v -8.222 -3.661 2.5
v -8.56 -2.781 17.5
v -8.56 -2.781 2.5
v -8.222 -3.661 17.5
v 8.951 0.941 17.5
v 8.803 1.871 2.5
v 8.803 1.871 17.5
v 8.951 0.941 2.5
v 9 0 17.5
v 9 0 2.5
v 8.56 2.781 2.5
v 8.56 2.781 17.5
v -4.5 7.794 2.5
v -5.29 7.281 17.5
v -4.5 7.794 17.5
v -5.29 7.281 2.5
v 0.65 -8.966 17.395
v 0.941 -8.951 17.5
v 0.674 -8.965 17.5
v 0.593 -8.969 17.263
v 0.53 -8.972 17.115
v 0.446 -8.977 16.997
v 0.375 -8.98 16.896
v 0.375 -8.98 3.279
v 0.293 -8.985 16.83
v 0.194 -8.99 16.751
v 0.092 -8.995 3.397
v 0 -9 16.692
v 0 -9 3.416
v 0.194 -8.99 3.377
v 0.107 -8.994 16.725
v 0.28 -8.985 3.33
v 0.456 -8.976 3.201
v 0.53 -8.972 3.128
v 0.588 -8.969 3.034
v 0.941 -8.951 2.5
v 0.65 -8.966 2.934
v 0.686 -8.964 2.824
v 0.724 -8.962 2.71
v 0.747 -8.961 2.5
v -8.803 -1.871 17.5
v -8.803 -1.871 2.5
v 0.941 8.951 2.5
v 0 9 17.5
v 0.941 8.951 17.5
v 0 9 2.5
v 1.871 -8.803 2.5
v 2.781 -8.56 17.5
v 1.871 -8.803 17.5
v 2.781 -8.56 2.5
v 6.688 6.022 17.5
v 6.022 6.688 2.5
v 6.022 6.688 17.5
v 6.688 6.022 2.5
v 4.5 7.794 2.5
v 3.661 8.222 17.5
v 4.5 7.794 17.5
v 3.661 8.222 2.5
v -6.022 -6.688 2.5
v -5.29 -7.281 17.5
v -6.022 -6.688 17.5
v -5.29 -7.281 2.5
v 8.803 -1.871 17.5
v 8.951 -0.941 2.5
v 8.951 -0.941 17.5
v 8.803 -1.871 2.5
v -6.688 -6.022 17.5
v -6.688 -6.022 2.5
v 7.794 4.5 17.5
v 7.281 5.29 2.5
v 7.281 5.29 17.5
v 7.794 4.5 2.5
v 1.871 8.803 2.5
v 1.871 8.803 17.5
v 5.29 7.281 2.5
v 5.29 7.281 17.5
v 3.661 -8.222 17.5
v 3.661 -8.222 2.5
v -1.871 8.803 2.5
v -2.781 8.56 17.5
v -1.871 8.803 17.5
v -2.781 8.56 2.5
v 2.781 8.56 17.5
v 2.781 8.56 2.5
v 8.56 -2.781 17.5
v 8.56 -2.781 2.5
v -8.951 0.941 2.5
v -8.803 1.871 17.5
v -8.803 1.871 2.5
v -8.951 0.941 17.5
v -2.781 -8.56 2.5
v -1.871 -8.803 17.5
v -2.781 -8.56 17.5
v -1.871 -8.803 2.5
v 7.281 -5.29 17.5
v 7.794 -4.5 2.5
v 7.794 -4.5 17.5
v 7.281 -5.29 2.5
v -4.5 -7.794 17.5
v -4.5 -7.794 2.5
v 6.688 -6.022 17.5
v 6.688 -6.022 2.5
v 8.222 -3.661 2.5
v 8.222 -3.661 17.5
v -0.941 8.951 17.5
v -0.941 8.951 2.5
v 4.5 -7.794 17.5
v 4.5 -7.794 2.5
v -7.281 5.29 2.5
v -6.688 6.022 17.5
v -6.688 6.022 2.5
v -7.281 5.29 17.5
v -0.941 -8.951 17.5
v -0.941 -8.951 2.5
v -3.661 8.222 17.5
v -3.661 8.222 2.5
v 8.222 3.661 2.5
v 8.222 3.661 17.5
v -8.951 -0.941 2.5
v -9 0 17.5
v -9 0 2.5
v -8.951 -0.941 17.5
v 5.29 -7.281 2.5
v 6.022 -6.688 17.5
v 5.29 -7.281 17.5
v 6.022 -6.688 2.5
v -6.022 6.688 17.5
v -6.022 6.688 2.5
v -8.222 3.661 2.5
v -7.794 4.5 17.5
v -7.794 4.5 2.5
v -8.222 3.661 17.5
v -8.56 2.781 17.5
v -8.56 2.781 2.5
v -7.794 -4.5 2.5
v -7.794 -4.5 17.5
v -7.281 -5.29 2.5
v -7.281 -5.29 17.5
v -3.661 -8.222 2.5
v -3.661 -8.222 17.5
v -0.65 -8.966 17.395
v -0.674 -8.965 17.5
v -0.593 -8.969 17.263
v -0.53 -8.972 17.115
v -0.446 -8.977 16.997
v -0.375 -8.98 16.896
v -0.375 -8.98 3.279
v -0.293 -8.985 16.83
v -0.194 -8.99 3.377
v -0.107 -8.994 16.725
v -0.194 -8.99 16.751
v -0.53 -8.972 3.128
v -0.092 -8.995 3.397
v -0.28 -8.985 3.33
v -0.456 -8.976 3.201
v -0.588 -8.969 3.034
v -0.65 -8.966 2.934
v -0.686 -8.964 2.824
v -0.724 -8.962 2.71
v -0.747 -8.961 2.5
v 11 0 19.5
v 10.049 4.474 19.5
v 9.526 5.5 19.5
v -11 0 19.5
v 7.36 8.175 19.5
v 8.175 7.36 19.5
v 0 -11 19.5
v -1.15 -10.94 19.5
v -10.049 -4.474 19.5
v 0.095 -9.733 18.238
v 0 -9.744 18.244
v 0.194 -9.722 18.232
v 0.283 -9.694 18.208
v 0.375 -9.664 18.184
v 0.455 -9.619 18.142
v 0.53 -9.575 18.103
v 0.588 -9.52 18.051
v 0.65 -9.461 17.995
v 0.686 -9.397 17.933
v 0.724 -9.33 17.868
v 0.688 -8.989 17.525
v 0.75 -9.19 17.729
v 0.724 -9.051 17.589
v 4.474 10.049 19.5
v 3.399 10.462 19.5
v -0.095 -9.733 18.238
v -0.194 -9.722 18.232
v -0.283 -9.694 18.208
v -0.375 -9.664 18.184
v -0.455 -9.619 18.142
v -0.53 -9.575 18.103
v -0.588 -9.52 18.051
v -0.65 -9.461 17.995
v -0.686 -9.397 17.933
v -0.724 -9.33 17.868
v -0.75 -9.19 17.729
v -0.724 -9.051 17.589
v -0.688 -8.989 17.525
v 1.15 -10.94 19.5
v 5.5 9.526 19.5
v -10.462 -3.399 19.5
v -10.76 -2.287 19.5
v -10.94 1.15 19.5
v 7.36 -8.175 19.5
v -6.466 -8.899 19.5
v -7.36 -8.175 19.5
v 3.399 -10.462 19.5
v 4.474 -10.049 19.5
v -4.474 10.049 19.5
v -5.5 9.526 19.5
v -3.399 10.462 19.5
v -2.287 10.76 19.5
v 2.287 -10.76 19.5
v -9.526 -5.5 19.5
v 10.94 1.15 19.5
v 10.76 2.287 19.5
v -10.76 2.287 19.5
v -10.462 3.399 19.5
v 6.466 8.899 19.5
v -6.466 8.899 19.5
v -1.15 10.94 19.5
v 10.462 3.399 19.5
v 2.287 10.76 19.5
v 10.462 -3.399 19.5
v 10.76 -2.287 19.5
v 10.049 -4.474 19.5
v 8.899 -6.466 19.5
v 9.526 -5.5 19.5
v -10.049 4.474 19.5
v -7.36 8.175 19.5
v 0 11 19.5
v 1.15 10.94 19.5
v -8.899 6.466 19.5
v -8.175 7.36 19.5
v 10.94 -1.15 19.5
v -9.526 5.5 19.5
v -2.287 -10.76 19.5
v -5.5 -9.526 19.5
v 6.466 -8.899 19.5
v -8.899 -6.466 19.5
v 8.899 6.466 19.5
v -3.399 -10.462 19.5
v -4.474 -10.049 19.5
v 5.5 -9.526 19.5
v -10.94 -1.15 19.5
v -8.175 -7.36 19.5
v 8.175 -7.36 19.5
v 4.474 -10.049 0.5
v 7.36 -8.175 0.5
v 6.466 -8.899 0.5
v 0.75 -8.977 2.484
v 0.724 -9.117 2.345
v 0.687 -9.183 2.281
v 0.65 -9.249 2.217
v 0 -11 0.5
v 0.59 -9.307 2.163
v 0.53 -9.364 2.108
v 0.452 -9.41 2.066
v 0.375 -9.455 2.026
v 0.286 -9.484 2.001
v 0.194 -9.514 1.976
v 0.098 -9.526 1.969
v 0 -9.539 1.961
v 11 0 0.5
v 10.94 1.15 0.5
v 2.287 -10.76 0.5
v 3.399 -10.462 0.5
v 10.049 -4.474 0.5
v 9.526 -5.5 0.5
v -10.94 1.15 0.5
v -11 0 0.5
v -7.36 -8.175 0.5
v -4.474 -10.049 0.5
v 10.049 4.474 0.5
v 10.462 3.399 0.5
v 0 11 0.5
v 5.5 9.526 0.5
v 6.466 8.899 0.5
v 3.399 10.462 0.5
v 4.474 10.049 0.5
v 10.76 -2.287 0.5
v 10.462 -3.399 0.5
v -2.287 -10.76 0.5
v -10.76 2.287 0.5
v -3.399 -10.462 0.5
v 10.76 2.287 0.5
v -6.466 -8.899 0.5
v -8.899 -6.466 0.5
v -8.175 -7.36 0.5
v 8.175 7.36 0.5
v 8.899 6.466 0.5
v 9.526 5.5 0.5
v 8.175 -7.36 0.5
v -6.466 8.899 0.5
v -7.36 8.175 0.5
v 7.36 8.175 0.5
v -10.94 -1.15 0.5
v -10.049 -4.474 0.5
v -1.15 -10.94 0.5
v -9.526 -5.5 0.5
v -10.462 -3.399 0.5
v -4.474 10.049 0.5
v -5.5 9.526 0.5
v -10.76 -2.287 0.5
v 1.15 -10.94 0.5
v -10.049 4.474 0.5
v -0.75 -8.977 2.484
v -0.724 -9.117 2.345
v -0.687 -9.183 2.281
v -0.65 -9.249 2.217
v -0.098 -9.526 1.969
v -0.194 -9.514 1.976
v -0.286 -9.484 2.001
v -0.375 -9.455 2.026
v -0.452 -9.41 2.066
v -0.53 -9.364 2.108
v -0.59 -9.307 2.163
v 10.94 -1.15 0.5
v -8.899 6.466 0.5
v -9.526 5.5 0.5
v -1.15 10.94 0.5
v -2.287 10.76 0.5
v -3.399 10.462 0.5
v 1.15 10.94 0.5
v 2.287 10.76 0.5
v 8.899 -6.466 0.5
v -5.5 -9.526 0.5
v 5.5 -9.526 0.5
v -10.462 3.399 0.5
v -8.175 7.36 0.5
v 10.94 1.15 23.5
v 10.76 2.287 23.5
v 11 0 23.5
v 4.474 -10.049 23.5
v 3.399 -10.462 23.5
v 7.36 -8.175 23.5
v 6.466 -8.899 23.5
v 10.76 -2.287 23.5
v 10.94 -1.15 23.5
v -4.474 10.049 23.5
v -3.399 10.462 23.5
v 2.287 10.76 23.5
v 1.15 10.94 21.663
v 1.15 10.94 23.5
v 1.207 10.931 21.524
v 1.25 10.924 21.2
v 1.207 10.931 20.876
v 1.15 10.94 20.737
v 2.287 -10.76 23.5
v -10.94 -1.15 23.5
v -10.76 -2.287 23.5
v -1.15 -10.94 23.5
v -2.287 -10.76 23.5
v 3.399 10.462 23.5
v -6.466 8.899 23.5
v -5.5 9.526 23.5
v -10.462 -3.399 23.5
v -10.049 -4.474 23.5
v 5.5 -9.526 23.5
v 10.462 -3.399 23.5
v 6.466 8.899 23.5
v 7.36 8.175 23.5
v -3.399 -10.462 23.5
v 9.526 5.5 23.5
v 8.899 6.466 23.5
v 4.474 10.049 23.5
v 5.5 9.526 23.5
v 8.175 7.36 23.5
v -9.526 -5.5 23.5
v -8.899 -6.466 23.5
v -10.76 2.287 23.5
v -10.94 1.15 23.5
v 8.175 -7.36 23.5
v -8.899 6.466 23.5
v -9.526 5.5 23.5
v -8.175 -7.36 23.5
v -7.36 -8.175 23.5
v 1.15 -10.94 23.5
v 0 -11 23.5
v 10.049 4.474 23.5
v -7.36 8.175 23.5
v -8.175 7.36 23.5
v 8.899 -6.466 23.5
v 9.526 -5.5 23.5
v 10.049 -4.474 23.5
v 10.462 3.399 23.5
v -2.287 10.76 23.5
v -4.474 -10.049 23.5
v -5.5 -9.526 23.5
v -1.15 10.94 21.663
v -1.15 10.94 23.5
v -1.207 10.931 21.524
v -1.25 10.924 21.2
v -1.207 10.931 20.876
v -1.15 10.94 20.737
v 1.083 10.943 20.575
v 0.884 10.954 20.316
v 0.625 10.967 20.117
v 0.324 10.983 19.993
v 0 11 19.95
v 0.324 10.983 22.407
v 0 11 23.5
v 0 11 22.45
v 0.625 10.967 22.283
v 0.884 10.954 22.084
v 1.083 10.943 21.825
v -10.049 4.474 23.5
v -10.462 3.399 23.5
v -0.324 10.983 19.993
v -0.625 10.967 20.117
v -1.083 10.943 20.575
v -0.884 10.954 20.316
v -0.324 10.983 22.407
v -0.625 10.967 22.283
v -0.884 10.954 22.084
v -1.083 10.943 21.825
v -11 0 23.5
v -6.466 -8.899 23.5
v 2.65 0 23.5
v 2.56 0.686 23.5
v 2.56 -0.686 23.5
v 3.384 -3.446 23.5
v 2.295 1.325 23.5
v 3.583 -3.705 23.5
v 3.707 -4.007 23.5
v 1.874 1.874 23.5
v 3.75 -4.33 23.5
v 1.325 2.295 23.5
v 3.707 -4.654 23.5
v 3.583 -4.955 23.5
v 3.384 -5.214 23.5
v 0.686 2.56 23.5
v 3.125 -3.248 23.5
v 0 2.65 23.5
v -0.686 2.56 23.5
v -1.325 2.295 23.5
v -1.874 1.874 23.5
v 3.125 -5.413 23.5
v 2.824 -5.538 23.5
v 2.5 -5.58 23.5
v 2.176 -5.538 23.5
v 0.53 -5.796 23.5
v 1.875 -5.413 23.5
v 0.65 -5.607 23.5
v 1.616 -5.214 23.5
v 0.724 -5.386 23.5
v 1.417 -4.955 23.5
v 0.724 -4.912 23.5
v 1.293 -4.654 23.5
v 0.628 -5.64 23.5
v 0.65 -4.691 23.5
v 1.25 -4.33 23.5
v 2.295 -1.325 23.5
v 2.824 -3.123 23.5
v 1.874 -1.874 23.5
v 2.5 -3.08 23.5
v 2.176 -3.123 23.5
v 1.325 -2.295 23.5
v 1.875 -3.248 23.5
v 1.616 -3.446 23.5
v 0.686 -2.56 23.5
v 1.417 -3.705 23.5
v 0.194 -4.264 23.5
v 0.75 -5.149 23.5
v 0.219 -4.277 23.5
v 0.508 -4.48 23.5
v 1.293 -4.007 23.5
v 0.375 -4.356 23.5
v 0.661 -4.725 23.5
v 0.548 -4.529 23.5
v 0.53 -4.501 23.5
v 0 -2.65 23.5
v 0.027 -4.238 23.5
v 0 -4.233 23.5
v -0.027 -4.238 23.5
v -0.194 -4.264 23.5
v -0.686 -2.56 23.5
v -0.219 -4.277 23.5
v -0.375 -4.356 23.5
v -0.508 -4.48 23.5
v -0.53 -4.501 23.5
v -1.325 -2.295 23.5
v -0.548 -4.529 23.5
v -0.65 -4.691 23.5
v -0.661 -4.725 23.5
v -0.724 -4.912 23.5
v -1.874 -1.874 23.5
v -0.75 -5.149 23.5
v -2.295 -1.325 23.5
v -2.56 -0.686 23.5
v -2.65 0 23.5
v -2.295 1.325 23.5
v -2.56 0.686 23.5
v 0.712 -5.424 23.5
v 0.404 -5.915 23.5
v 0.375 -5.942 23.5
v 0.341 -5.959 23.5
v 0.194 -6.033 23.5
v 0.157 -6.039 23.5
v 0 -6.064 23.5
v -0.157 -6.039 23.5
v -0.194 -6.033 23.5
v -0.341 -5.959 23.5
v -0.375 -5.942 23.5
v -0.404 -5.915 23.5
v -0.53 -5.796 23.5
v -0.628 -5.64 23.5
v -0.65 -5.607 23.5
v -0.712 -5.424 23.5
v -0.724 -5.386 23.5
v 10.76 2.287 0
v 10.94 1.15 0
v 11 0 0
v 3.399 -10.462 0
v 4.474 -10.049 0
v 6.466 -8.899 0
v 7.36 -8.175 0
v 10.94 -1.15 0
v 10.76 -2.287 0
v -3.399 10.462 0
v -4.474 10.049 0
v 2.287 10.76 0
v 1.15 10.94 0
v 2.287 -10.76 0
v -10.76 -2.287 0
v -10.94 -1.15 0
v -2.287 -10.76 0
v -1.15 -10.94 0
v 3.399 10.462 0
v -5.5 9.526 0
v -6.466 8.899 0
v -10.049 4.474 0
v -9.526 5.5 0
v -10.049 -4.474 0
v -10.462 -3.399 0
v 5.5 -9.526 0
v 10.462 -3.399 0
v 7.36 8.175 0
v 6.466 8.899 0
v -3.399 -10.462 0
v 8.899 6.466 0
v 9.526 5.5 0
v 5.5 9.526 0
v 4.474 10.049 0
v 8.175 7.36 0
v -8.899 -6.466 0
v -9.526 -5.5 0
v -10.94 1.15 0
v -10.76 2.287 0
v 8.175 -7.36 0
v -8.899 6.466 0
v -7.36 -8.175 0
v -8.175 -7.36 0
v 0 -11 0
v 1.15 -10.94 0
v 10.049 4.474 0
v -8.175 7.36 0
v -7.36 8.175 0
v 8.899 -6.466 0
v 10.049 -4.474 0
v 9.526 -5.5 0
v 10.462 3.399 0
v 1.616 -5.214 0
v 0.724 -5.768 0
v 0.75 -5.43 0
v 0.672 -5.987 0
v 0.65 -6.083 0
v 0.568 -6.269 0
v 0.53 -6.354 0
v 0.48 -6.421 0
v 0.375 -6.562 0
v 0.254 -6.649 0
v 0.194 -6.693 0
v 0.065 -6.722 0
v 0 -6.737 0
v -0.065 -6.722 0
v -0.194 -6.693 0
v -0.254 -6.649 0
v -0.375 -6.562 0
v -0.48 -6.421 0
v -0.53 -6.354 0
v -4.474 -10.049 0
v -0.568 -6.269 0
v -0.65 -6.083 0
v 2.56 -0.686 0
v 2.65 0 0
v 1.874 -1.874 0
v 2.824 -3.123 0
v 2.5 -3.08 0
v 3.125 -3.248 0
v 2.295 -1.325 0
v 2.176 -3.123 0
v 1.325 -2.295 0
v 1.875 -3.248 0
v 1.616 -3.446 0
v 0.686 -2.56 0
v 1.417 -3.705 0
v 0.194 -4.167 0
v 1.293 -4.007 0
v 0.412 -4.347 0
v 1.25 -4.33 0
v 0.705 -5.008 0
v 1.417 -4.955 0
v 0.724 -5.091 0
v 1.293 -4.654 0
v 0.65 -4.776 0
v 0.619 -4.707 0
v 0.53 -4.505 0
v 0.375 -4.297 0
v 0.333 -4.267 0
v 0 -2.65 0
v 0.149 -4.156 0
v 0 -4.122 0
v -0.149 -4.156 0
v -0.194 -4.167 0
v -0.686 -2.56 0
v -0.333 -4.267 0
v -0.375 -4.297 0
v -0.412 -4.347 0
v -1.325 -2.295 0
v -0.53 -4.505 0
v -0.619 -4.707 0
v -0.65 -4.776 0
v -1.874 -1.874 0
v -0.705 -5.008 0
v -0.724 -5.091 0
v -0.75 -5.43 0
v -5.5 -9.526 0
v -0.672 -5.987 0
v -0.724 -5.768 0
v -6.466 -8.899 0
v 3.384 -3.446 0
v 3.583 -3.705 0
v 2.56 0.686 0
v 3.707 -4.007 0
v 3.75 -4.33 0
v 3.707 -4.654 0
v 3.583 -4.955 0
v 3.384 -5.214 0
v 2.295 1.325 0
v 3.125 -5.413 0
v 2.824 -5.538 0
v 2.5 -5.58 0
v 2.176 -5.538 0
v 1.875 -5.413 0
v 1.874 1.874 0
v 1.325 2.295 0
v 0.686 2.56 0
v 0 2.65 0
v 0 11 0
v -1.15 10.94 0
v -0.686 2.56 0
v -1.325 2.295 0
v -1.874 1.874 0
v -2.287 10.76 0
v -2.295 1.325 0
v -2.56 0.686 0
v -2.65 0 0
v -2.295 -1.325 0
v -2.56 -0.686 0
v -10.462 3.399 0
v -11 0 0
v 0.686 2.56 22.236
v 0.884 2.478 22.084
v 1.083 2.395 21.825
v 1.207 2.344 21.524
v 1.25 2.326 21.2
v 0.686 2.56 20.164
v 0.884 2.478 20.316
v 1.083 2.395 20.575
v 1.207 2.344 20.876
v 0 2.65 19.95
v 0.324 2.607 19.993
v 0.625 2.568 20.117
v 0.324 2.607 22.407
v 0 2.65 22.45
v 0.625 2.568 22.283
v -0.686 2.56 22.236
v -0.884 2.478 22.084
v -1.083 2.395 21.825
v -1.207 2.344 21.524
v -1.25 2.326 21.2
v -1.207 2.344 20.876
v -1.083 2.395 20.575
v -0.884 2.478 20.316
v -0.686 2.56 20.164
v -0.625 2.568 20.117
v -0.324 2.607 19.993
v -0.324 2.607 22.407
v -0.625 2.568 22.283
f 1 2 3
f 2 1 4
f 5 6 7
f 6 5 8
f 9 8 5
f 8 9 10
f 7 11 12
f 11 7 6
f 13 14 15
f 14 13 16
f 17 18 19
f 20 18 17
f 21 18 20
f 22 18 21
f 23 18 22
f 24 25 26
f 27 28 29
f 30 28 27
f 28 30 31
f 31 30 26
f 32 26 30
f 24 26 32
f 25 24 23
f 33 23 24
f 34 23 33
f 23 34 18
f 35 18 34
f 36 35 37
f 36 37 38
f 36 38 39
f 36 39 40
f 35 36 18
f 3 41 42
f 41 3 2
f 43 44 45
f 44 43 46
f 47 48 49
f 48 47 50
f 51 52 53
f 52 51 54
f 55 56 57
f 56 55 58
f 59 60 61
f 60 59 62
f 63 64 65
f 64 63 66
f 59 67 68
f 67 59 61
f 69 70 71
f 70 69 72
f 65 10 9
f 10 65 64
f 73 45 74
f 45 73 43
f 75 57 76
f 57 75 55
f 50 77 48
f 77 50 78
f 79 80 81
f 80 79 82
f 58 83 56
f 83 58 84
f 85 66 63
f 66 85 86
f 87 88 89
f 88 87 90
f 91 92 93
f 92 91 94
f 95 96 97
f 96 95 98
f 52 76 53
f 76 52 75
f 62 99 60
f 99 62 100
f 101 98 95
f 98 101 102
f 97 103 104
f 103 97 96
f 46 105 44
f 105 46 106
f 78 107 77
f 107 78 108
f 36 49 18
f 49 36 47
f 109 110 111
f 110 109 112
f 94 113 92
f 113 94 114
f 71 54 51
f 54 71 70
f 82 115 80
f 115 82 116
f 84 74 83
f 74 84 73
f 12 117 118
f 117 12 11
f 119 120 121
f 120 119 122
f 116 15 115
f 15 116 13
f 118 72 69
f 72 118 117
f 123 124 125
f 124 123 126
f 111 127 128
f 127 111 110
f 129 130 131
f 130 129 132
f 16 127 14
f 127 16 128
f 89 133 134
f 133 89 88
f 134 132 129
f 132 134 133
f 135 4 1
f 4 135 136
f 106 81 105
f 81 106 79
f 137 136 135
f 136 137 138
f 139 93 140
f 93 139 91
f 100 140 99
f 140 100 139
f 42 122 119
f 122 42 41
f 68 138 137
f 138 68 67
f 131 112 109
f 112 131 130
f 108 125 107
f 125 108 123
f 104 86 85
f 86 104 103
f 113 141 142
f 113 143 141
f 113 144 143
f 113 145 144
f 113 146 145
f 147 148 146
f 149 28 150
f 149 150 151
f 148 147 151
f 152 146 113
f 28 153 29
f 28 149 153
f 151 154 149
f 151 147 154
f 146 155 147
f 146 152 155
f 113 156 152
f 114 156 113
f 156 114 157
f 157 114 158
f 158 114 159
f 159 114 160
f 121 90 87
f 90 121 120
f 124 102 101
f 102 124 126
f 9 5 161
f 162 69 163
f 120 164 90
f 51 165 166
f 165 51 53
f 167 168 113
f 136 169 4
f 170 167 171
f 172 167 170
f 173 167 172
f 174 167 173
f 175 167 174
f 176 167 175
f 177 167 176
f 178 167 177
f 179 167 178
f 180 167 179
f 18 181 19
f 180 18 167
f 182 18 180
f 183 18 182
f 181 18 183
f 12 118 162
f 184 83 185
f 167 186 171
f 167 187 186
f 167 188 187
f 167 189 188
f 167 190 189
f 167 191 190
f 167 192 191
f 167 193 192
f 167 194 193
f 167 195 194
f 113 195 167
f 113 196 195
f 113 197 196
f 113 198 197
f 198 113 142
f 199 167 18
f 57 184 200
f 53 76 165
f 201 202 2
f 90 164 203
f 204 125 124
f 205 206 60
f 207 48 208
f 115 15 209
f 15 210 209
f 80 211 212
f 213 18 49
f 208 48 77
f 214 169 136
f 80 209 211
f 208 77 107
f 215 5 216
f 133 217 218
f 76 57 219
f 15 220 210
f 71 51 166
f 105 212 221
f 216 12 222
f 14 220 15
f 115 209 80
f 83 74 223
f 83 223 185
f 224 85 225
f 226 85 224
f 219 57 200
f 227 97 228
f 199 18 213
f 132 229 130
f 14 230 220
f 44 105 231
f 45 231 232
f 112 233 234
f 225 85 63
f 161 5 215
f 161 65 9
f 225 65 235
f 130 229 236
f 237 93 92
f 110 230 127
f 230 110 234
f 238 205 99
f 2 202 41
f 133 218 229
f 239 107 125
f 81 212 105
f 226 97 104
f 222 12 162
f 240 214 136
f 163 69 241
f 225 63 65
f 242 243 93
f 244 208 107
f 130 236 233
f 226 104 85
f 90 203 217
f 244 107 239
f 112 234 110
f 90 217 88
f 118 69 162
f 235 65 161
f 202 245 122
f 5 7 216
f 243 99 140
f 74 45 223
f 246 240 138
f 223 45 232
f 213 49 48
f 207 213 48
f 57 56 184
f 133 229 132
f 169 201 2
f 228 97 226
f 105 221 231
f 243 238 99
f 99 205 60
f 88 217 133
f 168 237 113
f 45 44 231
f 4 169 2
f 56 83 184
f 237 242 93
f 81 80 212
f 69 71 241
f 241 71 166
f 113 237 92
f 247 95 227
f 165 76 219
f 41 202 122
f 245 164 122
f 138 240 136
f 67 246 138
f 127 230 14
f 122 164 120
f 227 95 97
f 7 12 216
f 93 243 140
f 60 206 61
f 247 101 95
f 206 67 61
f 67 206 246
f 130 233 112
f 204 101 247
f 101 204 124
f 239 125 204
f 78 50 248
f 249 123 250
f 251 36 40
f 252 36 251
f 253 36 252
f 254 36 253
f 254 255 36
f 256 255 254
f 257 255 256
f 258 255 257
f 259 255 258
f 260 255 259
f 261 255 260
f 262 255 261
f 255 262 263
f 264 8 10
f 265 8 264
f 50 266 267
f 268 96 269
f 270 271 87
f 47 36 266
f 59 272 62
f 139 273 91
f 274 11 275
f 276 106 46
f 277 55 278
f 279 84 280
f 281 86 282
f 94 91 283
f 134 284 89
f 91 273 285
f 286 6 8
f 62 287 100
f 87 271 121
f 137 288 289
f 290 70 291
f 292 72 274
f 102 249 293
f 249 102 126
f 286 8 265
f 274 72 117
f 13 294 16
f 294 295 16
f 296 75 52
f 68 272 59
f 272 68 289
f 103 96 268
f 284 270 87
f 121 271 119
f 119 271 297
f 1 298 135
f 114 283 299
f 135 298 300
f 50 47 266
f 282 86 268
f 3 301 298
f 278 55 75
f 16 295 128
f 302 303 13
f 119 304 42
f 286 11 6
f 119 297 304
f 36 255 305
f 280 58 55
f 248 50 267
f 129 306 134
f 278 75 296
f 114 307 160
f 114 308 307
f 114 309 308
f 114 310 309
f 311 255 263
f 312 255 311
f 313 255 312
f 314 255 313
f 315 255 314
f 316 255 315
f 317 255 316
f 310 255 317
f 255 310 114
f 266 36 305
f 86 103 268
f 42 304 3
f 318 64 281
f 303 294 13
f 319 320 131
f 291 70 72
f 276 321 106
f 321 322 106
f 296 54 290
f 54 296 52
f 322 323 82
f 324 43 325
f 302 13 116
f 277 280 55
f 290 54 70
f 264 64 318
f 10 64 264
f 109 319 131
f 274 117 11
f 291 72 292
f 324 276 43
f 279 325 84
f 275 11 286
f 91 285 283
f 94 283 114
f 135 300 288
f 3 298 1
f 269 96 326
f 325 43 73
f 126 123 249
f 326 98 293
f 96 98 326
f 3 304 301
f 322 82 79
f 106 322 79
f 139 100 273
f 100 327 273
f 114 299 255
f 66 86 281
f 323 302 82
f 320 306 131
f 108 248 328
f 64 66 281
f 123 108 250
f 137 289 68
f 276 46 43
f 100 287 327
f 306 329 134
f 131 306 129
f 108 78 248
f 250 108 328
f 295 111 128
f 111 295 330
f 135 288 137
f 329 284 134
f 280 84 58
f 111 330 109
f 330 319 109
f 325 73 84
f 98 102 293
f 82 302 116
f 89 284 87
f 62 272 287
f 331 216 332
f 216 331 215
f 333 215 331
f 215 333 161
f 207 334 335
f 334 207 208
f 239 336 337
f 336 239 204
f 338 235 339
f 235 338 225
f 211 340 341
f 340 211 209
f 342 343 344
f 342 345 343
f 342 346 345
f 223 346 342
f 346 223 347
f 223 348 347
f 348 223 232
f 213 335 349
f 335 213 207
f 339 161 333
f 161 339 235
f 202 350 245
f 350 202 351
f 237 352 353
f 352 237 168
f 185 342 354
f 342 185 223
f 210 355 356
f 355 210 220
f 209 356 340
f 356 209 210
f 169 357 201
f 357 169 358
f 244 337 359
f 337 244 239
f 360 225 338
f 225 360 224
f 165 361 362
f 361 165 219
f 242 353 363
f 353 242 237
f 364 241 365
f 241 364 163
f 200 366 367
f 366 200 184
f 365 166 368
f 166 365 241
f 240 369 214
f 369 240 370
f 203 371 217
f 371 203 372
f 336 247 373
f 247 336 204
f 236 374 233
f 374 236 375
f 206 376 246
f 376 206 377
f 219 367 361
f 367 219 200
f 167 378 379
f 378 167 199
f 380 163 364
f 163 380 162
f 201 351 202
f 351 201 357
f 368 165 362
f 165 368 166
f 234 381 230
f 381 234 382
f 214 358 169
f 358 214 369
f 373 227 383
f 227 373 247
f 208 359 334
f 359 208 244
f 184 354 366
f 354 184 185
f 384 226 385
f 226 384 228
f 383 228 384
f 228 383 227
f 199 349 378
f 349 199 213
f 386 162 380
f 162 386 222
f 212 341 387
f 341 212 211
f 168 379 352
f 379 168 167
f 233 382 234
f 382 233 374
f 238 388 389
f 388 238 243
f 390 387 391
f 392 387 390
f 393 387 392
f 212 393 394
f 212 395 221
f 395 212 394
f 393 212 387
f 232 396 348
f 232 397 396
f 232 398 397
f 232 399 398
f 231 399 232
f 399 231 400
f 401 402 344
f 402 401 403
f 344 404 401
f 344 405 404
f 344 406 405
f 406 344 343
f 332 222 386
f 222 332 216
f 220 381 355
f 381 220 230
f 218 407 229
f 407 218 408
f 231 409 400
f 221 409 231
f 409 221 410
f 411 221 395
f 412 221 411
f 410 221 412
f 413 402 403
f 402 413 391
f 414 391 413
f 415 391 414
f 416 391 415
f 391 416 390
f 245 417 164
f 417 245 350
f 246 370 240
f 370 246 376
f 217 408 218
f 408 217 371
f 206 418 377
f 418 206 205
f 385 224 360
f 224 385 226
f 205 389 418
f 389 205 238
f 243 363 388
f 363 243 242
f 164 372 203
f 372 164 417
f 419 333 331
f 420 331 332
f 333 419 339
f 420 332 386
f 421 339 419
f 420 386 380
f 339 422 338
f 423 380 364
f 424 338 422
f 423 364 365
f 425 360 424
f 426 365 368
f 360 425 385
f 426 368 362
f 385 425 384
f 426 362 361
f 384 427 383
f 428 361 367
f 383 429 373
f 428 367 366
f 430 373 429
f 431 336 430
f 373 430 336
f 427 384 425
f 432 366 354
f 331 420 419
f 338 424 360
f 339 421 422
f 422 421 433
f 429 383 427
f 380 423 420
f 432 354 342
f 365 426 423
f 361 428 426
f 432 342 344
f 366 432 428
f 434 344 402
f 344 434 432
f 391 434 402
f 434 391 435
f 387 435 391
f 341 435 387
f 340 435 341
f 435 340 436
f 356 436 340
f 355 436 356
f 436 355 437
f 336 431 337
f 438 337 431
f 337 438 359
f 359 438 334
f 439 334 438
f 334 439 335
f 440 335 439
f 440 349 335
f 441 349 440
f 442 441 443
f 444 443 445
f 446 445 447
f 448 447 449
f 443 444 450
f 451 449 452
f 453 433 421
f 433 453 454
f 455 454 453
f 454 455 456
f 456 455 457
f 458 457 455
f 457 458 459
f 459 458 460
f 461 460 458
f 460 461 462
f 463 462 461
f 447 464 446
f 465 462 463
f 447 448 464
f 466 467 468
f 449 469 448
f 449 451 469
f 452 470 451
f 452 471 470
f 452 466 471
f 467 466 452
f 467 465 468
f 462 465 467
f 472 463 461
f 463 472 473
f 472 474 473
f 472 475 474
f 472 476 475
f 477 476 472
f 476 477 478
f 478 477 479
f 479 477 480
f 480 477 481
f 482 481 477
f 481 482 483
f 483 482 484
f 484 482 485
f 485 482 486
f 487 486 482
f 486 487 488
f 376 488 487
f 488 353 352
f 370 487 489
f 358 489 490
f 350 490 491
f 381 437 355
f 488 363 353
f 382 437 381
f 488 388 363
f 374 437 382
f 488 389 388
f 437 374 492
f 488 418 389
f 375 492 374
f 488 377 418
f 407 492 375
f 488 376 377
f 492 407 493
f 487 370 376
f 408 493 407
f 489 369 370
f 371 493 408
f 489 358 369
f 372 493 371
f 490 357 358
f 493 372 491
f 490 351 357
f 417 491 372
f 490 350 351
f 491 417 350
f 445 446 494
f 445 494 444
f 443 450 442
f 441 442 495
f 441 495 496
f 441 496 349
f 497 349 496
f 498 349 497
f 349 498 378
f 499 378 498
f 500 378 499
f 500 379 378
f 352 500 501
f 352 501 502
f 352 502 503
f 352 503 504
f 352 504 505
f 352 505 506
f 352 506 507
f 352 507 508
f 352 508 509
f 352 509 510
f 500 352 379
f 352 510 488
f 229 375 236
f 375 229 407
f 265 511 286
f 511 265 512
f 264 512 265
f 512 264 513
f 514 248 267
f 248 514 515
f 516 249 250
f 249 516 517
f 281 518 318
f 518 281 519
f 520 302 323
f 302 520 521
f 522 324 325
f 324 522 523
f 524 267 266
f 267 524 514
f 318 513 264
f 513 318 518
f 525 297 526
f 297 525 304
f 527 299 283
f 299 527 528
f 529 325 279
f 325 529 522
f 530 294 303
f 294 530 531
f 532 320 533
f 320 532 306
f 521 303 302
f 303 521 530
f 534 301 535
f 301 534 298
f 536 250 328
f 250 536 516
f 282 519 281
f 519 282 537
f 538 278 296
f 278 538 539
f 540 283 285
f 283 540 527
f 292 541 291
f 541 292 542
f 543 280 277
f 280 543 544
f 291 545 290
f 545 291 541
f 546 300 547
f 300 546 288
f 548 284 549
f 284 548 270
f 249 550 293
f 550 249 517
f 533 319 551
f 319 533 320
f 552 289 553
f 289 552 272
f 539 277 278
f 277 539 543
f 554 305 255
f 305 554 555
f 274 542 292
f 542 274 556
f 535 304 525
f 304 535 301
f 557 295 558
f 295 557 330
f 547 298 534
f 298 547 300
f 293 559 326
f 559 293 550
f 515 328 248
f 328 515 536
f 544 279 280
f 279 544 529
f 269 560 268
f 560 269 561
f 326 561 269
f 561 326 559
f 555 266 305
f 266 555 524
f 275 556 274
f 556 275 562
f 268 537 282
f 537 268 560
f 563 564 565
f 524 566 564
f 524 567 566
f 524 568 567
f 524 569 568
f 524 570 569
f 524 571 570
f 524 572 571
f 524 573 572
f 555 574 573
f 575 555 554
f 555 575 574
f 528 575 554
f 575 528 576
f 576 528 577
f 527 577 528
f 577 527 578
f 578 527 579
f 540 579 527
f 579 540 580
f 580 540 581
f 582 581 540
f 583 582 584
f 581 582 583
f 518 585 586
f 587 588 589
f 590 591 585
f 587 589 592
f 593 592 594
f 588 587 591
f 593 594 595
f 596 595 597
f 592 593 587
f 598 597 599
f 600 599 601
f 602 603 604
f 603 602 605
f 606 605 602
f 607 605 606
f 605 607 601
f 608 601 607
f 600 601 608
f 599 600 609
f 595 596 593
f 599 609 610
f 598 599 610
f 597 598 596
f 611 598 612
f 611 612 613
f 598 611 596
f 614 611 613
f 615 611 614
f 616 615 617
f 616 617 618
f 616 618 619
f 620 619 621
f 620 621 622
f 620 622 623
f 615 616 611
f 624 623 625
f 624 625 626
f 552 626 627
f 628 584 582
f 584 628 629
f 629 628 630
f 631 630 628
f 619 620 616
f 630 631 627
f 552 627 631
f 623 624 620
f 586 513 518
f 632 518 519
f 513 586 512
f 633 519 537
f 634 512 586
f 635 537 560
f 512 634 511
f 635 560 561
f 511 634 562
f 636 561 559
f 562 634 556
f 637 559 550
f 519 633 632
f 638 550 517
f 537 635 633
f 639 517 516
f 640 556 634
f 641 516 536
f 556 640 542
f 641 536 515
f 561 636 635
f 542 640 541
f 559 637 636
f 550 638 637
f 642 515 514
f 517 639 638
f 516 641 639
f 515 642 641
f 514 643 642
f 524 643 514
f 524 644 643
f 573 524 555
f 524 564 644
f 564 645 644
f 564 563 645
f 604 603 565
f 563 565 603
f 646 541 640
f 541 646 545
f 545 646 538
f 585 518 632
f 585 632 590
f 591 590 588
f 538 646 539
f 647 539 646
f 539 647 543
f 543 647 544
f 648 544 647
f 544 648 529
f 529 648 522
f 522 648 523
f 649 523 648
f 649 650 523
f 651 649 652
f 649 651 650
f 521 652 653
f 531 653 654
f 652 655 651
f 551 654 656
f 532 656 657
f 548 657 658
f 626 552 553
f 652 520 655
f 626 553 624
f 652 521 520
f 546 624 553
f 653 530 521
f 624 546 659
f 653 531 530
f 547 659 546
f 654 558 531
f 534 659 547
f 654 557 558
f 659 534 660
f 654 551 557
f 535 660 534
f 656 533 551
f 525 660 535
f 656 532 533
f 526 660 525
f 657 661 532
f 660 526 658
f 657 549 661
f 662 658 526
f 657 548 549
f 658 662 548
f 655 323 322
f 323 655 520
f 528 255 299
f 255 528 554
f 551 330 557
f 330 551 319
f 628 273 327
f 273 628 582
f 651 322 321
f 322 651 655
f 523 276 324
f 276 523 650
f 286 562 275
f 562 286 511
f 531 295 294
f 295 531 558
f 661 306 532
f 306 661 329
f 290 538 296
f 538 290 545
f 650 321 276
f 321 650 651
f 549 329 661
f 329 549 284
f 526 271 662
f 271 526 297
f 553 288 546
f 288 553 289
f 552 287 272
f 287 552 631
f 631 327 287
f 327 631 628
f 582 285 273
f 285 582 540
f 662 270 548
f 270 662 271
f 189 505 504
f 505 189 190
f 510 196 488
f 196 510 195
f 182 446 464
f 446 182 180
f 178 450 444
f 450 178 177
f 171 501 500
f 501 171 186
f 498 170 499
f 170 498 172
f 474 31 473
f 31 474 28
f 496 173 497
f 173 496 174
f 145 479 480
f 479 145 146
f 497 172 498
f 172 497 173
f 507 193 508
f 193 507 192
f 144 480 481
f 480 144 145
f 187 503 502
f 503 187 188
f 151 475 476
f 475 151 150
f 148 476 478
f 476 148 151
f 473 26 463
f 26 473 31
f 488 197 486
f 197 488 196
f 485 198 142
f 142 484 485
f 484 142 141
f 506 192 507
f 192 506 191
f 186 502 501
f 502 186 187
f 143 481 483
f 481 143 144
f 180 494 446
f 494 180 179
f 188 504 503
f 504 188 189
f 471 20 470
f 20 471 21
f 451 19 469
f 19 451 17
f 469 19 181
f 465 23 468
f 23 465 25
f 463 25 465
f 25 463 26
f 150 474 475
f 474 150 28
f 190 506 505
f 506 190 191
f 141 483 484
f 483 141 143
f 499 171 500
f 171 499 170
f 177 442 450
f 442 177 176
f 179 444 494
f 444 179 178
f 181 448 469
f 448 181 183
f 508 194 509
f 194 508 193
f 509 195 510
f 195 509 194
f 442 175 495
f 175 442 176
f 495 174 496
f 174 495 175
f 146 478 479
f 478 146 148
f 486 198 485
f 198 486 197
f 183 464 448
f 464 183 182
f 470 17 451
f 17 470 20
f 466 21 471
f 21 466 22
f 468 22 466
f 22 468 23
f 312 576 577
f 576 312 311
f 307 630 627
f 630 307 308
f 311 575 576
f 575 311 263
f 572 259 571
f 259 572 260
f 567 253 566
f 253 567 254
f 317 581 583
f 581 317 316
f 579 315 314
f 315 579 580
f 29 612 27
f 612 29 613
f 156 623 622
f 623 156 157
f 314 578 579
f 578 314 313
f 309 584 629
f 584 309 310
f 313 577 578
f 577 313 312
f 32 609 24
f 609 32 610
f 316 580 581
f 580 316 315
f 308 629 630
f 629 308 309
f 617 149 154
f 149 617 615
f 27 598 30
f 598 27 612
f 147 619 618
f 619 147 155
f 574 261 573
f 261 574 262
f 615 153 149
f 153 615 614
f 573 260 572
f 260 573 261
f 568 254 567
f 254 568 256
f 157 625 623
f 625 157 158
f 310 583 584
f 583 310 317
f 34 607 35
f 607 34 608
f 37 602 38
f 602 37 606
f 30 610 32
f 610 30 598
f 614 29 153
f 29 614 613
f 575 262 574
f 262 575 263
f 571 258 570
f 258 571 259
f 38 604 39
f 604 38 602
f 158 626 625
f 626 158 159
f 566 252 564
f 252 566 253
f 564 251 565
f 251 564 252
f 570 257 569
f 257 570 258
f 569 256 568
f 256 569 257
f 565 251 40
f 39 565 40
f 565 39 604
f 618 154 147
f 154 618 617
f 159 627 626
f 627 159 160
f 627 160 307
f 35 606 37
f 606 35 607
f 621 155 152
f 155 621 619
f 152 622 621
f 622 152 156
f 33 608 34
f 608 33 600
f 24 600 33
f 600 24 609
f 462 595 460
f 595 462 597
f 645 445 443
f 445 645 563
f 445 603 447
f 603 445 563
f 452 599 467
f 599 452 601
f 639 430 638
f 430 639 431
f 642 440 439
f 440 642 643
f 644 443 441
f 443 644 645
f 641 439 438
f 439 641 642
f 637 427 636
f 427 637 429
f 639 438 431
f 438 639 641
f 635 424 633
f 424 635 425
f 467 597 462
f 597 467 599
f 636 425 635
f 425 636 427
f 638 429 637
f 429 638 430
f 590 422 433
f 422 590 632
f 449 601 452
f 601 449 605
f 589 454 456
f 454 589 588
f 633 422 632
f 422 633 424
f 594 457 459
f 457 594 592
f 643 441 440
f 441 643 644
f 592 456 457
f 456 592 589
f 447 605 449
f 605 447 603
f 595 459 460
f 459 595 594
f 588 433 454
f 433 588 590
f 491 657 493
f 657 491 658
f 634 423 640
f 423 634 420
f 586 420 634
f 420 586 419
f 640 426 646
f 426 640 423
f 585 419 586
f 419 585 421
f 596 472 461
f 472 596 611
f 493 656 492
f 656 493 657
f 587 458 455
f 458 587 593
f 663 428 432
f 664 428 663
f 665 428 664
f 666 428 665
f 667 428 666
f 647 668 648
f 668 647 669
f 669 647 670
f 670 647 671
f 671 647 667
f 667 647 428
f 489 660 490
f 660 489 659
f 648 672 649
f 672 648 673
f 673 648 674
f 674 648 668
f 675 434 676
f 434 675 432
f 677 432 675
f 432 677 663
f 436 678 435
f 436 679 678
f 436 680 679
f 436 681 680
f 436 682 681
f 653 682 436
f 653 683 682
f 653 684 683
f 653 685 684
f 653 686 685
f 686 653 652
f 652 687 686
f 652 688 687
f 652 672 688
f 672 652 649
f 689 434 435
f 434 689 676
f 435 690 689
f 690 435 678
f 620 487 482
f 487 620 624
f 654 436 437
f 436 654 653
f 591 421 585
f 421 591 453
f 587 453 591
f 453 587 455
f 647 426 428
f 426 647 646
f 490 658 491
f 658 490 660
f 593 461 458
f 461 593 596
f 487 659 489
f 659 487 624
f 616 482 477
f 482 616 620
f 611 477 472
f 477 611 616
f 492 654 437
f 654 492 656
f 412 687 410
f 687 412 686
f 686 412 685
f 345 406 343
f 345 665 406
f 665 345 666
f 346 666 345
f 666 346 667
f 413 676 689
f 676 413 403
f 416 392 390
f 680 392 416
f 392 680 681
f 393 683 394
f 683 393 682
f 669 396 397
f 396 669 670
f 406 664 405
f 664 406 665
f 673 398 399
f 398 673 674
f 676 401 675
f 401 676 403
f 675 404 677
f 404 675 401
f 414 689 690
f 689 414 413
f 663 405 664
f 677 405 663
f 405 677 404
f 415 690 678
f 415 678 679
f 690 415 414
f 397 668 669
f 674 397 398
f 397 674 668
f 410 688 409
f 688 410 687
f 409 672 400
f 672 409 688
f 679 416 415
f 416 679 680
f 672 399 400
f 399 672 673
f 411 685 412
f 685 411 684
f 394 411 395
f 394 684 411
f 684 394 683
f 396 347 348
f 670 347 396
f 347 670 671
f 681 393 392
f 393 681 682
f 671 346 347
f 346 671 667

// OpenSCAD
radius = 9;
width = 17;
top = 4;
smoothness = 60;

module spool() {

	difference() {
		union() {
			cylinder(r=radius, h=width, center=true, $fn=smoothness);
			translate([0, 0, width/2+0.5])
			cylinder(r1=radius, r2=radius+2, h=2, center=true, $fn=smoothness);
			translate([0, 0, -width/2+.5])
			cylinder(r2=radius, r1=radius+2, h=2, center=true, $fn=smoothness);
			translate([0, 0, width/2+top/2+1.5])
			cylinder(r=radius+2, h=top, center=true, $fn=smoothness);
			translate([0, 0, -width/2-.75])
			cylinder(r=radius+2, h=0.5, center=true, $fn=smoothness);
		}

		// Motor shaft.
		cylinder(r=(5+0.3)/2, h=50, center=true, $fn=24);

		// Filament tunnels.
		rotate([0,0,180]) {
			translate([0, radius, width/2]) rotate([35, 0, 0])
			cylinder(r=.75, h=20, center=true, $fn=24);
			translate([0, radius, -width/2+1.5]) rotate([-55, 0, 0])
			cylinder(r=.75, h=20, center=true, $fn=24);
			rotate([0,0,30])
			translate([0, 5, 0])
			cylinder(r=1.25, h=40, center=true, $fn=24); }

		translate([0, 5.5, width/2+3.2]) rotate([90, 0, 0]) {
			cylinder(r=1.25, h=radius+5, center=true, $fn=24);
		}
	}
}

translate([0, 0, width/2+1]) spool();
